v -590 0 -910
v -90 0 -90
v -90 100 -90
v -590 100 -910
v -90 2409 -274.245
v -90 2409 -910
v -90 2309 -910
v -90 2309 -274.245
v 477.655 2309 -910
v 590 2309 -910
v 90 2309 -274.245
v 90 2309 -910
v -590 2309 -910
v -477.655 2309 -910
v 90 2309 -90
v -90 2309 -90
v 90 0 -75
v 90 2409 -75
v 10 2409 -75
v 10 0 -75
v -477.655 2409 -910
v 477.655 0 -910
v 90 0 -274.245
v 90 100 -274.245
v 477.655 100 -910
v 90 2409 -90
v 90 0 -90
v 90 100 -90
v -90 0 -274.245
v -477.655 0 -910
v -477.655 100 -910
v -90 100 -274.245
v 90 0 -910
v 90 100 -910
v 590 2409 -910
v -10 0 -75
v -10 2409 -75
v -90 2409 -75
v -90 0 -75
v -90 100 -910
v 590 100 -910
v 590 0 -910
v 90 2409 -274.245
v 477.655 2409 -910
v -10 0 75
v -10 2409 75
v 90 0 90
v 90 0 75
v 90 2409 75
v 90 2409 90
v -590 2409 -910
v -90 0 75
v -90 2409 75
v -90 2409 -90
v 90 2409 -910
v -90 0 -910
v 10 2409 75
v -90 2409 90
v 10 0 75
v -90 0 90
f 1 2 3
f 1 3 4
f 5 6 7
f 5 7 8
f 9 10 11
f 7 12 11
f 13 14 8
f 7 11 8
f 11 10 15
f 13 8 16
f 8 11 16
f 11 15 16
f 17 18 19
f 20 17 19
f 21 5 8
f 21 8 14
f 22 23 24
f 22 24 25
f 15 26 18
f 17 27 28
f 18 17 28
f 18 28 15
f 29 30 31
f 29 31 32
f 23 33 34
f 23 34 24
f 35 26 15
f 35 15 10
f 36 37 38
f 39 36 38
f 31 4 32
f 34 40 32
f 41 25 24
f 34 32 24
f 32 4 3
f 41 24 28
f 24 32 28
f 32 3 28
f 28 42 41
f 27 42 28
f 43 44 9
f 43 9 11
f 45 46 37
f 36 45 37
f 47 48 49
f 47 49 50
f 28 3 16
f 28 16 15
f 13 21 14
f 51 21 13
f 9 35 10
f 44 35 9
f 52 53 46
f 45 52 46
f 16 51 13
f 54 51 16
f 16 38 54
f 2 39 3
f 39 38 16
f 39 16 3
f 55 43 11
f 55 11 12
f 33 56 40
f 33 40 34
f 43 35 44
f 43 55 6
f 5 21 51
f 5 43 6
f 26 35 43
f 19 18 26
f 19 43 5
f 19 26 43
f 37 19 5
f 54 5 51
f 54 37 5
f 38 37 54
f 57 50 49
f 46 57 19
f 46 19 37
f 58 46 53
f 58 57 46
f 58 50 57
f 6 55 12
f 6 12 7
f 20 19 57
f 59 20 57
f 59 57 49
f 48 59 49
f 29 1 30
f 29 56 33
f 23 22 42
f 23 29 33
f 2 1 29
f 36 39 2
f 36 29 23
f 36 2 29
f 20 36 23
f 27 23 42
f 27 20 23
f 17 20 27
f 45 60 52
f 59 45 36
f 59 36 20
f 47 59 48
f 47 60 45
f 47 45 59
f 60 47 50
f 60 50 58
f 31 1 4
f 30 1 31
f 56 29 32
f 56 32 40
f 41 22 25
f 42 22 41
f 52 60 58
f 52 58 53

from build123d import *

# Parameters (mm, degrees)
F1_DEPTH = 2409
F3_DEPTH = 100
F5_DEPTH = 100


with BuildPart() as f1:
    # F0 (on Front) → F1 (new body)
    with BuildSketch(Plane.XZ):
        Polygon((-90, -90), (90, -90), (90, -75), (10, -75), (10, 75), (90, 75), (90, 90), (-90, 90), (-90, 75), (-10, 75), (-10, -75), (-90, -75), align=None)
    extrude(amount=-F1_DEPTH)

    # F2 (on Front) → F3 (join)
    with BuildSketch(Plane.XZ):
        Polygon((90, -274.244994), (90, -90), (-90, -90), (-90, -274.244994), (-90, -910), (90, -910), align=None)
        Polygon((590, -910), (90, -90), (90, -274.244994), (477.655492, -910), align=None)
        Polygon((-90, -274.244994), (-90, -90), (-590, -910), (-477.655492, -910), align=None)
    extrude(amount=-F3_DEPTH)

    # F4 (on face) → F5 (join)
    with BuildSketch(Plane(origin=(0, 2409, 0), x_dir=(-1, 0, 0), z_dir=(0, 1, 0))):
        Polygon((90, -910), (90, -274.244994), (477.655492, -910), (590, -910), (90, -90), (-90, -90), (-590, -910), (-477.655492, -910), (-90, -274.244994), (-90, -910), align=None)
    extrude(amount=-F5_DEPTH)


solid = f1.part
